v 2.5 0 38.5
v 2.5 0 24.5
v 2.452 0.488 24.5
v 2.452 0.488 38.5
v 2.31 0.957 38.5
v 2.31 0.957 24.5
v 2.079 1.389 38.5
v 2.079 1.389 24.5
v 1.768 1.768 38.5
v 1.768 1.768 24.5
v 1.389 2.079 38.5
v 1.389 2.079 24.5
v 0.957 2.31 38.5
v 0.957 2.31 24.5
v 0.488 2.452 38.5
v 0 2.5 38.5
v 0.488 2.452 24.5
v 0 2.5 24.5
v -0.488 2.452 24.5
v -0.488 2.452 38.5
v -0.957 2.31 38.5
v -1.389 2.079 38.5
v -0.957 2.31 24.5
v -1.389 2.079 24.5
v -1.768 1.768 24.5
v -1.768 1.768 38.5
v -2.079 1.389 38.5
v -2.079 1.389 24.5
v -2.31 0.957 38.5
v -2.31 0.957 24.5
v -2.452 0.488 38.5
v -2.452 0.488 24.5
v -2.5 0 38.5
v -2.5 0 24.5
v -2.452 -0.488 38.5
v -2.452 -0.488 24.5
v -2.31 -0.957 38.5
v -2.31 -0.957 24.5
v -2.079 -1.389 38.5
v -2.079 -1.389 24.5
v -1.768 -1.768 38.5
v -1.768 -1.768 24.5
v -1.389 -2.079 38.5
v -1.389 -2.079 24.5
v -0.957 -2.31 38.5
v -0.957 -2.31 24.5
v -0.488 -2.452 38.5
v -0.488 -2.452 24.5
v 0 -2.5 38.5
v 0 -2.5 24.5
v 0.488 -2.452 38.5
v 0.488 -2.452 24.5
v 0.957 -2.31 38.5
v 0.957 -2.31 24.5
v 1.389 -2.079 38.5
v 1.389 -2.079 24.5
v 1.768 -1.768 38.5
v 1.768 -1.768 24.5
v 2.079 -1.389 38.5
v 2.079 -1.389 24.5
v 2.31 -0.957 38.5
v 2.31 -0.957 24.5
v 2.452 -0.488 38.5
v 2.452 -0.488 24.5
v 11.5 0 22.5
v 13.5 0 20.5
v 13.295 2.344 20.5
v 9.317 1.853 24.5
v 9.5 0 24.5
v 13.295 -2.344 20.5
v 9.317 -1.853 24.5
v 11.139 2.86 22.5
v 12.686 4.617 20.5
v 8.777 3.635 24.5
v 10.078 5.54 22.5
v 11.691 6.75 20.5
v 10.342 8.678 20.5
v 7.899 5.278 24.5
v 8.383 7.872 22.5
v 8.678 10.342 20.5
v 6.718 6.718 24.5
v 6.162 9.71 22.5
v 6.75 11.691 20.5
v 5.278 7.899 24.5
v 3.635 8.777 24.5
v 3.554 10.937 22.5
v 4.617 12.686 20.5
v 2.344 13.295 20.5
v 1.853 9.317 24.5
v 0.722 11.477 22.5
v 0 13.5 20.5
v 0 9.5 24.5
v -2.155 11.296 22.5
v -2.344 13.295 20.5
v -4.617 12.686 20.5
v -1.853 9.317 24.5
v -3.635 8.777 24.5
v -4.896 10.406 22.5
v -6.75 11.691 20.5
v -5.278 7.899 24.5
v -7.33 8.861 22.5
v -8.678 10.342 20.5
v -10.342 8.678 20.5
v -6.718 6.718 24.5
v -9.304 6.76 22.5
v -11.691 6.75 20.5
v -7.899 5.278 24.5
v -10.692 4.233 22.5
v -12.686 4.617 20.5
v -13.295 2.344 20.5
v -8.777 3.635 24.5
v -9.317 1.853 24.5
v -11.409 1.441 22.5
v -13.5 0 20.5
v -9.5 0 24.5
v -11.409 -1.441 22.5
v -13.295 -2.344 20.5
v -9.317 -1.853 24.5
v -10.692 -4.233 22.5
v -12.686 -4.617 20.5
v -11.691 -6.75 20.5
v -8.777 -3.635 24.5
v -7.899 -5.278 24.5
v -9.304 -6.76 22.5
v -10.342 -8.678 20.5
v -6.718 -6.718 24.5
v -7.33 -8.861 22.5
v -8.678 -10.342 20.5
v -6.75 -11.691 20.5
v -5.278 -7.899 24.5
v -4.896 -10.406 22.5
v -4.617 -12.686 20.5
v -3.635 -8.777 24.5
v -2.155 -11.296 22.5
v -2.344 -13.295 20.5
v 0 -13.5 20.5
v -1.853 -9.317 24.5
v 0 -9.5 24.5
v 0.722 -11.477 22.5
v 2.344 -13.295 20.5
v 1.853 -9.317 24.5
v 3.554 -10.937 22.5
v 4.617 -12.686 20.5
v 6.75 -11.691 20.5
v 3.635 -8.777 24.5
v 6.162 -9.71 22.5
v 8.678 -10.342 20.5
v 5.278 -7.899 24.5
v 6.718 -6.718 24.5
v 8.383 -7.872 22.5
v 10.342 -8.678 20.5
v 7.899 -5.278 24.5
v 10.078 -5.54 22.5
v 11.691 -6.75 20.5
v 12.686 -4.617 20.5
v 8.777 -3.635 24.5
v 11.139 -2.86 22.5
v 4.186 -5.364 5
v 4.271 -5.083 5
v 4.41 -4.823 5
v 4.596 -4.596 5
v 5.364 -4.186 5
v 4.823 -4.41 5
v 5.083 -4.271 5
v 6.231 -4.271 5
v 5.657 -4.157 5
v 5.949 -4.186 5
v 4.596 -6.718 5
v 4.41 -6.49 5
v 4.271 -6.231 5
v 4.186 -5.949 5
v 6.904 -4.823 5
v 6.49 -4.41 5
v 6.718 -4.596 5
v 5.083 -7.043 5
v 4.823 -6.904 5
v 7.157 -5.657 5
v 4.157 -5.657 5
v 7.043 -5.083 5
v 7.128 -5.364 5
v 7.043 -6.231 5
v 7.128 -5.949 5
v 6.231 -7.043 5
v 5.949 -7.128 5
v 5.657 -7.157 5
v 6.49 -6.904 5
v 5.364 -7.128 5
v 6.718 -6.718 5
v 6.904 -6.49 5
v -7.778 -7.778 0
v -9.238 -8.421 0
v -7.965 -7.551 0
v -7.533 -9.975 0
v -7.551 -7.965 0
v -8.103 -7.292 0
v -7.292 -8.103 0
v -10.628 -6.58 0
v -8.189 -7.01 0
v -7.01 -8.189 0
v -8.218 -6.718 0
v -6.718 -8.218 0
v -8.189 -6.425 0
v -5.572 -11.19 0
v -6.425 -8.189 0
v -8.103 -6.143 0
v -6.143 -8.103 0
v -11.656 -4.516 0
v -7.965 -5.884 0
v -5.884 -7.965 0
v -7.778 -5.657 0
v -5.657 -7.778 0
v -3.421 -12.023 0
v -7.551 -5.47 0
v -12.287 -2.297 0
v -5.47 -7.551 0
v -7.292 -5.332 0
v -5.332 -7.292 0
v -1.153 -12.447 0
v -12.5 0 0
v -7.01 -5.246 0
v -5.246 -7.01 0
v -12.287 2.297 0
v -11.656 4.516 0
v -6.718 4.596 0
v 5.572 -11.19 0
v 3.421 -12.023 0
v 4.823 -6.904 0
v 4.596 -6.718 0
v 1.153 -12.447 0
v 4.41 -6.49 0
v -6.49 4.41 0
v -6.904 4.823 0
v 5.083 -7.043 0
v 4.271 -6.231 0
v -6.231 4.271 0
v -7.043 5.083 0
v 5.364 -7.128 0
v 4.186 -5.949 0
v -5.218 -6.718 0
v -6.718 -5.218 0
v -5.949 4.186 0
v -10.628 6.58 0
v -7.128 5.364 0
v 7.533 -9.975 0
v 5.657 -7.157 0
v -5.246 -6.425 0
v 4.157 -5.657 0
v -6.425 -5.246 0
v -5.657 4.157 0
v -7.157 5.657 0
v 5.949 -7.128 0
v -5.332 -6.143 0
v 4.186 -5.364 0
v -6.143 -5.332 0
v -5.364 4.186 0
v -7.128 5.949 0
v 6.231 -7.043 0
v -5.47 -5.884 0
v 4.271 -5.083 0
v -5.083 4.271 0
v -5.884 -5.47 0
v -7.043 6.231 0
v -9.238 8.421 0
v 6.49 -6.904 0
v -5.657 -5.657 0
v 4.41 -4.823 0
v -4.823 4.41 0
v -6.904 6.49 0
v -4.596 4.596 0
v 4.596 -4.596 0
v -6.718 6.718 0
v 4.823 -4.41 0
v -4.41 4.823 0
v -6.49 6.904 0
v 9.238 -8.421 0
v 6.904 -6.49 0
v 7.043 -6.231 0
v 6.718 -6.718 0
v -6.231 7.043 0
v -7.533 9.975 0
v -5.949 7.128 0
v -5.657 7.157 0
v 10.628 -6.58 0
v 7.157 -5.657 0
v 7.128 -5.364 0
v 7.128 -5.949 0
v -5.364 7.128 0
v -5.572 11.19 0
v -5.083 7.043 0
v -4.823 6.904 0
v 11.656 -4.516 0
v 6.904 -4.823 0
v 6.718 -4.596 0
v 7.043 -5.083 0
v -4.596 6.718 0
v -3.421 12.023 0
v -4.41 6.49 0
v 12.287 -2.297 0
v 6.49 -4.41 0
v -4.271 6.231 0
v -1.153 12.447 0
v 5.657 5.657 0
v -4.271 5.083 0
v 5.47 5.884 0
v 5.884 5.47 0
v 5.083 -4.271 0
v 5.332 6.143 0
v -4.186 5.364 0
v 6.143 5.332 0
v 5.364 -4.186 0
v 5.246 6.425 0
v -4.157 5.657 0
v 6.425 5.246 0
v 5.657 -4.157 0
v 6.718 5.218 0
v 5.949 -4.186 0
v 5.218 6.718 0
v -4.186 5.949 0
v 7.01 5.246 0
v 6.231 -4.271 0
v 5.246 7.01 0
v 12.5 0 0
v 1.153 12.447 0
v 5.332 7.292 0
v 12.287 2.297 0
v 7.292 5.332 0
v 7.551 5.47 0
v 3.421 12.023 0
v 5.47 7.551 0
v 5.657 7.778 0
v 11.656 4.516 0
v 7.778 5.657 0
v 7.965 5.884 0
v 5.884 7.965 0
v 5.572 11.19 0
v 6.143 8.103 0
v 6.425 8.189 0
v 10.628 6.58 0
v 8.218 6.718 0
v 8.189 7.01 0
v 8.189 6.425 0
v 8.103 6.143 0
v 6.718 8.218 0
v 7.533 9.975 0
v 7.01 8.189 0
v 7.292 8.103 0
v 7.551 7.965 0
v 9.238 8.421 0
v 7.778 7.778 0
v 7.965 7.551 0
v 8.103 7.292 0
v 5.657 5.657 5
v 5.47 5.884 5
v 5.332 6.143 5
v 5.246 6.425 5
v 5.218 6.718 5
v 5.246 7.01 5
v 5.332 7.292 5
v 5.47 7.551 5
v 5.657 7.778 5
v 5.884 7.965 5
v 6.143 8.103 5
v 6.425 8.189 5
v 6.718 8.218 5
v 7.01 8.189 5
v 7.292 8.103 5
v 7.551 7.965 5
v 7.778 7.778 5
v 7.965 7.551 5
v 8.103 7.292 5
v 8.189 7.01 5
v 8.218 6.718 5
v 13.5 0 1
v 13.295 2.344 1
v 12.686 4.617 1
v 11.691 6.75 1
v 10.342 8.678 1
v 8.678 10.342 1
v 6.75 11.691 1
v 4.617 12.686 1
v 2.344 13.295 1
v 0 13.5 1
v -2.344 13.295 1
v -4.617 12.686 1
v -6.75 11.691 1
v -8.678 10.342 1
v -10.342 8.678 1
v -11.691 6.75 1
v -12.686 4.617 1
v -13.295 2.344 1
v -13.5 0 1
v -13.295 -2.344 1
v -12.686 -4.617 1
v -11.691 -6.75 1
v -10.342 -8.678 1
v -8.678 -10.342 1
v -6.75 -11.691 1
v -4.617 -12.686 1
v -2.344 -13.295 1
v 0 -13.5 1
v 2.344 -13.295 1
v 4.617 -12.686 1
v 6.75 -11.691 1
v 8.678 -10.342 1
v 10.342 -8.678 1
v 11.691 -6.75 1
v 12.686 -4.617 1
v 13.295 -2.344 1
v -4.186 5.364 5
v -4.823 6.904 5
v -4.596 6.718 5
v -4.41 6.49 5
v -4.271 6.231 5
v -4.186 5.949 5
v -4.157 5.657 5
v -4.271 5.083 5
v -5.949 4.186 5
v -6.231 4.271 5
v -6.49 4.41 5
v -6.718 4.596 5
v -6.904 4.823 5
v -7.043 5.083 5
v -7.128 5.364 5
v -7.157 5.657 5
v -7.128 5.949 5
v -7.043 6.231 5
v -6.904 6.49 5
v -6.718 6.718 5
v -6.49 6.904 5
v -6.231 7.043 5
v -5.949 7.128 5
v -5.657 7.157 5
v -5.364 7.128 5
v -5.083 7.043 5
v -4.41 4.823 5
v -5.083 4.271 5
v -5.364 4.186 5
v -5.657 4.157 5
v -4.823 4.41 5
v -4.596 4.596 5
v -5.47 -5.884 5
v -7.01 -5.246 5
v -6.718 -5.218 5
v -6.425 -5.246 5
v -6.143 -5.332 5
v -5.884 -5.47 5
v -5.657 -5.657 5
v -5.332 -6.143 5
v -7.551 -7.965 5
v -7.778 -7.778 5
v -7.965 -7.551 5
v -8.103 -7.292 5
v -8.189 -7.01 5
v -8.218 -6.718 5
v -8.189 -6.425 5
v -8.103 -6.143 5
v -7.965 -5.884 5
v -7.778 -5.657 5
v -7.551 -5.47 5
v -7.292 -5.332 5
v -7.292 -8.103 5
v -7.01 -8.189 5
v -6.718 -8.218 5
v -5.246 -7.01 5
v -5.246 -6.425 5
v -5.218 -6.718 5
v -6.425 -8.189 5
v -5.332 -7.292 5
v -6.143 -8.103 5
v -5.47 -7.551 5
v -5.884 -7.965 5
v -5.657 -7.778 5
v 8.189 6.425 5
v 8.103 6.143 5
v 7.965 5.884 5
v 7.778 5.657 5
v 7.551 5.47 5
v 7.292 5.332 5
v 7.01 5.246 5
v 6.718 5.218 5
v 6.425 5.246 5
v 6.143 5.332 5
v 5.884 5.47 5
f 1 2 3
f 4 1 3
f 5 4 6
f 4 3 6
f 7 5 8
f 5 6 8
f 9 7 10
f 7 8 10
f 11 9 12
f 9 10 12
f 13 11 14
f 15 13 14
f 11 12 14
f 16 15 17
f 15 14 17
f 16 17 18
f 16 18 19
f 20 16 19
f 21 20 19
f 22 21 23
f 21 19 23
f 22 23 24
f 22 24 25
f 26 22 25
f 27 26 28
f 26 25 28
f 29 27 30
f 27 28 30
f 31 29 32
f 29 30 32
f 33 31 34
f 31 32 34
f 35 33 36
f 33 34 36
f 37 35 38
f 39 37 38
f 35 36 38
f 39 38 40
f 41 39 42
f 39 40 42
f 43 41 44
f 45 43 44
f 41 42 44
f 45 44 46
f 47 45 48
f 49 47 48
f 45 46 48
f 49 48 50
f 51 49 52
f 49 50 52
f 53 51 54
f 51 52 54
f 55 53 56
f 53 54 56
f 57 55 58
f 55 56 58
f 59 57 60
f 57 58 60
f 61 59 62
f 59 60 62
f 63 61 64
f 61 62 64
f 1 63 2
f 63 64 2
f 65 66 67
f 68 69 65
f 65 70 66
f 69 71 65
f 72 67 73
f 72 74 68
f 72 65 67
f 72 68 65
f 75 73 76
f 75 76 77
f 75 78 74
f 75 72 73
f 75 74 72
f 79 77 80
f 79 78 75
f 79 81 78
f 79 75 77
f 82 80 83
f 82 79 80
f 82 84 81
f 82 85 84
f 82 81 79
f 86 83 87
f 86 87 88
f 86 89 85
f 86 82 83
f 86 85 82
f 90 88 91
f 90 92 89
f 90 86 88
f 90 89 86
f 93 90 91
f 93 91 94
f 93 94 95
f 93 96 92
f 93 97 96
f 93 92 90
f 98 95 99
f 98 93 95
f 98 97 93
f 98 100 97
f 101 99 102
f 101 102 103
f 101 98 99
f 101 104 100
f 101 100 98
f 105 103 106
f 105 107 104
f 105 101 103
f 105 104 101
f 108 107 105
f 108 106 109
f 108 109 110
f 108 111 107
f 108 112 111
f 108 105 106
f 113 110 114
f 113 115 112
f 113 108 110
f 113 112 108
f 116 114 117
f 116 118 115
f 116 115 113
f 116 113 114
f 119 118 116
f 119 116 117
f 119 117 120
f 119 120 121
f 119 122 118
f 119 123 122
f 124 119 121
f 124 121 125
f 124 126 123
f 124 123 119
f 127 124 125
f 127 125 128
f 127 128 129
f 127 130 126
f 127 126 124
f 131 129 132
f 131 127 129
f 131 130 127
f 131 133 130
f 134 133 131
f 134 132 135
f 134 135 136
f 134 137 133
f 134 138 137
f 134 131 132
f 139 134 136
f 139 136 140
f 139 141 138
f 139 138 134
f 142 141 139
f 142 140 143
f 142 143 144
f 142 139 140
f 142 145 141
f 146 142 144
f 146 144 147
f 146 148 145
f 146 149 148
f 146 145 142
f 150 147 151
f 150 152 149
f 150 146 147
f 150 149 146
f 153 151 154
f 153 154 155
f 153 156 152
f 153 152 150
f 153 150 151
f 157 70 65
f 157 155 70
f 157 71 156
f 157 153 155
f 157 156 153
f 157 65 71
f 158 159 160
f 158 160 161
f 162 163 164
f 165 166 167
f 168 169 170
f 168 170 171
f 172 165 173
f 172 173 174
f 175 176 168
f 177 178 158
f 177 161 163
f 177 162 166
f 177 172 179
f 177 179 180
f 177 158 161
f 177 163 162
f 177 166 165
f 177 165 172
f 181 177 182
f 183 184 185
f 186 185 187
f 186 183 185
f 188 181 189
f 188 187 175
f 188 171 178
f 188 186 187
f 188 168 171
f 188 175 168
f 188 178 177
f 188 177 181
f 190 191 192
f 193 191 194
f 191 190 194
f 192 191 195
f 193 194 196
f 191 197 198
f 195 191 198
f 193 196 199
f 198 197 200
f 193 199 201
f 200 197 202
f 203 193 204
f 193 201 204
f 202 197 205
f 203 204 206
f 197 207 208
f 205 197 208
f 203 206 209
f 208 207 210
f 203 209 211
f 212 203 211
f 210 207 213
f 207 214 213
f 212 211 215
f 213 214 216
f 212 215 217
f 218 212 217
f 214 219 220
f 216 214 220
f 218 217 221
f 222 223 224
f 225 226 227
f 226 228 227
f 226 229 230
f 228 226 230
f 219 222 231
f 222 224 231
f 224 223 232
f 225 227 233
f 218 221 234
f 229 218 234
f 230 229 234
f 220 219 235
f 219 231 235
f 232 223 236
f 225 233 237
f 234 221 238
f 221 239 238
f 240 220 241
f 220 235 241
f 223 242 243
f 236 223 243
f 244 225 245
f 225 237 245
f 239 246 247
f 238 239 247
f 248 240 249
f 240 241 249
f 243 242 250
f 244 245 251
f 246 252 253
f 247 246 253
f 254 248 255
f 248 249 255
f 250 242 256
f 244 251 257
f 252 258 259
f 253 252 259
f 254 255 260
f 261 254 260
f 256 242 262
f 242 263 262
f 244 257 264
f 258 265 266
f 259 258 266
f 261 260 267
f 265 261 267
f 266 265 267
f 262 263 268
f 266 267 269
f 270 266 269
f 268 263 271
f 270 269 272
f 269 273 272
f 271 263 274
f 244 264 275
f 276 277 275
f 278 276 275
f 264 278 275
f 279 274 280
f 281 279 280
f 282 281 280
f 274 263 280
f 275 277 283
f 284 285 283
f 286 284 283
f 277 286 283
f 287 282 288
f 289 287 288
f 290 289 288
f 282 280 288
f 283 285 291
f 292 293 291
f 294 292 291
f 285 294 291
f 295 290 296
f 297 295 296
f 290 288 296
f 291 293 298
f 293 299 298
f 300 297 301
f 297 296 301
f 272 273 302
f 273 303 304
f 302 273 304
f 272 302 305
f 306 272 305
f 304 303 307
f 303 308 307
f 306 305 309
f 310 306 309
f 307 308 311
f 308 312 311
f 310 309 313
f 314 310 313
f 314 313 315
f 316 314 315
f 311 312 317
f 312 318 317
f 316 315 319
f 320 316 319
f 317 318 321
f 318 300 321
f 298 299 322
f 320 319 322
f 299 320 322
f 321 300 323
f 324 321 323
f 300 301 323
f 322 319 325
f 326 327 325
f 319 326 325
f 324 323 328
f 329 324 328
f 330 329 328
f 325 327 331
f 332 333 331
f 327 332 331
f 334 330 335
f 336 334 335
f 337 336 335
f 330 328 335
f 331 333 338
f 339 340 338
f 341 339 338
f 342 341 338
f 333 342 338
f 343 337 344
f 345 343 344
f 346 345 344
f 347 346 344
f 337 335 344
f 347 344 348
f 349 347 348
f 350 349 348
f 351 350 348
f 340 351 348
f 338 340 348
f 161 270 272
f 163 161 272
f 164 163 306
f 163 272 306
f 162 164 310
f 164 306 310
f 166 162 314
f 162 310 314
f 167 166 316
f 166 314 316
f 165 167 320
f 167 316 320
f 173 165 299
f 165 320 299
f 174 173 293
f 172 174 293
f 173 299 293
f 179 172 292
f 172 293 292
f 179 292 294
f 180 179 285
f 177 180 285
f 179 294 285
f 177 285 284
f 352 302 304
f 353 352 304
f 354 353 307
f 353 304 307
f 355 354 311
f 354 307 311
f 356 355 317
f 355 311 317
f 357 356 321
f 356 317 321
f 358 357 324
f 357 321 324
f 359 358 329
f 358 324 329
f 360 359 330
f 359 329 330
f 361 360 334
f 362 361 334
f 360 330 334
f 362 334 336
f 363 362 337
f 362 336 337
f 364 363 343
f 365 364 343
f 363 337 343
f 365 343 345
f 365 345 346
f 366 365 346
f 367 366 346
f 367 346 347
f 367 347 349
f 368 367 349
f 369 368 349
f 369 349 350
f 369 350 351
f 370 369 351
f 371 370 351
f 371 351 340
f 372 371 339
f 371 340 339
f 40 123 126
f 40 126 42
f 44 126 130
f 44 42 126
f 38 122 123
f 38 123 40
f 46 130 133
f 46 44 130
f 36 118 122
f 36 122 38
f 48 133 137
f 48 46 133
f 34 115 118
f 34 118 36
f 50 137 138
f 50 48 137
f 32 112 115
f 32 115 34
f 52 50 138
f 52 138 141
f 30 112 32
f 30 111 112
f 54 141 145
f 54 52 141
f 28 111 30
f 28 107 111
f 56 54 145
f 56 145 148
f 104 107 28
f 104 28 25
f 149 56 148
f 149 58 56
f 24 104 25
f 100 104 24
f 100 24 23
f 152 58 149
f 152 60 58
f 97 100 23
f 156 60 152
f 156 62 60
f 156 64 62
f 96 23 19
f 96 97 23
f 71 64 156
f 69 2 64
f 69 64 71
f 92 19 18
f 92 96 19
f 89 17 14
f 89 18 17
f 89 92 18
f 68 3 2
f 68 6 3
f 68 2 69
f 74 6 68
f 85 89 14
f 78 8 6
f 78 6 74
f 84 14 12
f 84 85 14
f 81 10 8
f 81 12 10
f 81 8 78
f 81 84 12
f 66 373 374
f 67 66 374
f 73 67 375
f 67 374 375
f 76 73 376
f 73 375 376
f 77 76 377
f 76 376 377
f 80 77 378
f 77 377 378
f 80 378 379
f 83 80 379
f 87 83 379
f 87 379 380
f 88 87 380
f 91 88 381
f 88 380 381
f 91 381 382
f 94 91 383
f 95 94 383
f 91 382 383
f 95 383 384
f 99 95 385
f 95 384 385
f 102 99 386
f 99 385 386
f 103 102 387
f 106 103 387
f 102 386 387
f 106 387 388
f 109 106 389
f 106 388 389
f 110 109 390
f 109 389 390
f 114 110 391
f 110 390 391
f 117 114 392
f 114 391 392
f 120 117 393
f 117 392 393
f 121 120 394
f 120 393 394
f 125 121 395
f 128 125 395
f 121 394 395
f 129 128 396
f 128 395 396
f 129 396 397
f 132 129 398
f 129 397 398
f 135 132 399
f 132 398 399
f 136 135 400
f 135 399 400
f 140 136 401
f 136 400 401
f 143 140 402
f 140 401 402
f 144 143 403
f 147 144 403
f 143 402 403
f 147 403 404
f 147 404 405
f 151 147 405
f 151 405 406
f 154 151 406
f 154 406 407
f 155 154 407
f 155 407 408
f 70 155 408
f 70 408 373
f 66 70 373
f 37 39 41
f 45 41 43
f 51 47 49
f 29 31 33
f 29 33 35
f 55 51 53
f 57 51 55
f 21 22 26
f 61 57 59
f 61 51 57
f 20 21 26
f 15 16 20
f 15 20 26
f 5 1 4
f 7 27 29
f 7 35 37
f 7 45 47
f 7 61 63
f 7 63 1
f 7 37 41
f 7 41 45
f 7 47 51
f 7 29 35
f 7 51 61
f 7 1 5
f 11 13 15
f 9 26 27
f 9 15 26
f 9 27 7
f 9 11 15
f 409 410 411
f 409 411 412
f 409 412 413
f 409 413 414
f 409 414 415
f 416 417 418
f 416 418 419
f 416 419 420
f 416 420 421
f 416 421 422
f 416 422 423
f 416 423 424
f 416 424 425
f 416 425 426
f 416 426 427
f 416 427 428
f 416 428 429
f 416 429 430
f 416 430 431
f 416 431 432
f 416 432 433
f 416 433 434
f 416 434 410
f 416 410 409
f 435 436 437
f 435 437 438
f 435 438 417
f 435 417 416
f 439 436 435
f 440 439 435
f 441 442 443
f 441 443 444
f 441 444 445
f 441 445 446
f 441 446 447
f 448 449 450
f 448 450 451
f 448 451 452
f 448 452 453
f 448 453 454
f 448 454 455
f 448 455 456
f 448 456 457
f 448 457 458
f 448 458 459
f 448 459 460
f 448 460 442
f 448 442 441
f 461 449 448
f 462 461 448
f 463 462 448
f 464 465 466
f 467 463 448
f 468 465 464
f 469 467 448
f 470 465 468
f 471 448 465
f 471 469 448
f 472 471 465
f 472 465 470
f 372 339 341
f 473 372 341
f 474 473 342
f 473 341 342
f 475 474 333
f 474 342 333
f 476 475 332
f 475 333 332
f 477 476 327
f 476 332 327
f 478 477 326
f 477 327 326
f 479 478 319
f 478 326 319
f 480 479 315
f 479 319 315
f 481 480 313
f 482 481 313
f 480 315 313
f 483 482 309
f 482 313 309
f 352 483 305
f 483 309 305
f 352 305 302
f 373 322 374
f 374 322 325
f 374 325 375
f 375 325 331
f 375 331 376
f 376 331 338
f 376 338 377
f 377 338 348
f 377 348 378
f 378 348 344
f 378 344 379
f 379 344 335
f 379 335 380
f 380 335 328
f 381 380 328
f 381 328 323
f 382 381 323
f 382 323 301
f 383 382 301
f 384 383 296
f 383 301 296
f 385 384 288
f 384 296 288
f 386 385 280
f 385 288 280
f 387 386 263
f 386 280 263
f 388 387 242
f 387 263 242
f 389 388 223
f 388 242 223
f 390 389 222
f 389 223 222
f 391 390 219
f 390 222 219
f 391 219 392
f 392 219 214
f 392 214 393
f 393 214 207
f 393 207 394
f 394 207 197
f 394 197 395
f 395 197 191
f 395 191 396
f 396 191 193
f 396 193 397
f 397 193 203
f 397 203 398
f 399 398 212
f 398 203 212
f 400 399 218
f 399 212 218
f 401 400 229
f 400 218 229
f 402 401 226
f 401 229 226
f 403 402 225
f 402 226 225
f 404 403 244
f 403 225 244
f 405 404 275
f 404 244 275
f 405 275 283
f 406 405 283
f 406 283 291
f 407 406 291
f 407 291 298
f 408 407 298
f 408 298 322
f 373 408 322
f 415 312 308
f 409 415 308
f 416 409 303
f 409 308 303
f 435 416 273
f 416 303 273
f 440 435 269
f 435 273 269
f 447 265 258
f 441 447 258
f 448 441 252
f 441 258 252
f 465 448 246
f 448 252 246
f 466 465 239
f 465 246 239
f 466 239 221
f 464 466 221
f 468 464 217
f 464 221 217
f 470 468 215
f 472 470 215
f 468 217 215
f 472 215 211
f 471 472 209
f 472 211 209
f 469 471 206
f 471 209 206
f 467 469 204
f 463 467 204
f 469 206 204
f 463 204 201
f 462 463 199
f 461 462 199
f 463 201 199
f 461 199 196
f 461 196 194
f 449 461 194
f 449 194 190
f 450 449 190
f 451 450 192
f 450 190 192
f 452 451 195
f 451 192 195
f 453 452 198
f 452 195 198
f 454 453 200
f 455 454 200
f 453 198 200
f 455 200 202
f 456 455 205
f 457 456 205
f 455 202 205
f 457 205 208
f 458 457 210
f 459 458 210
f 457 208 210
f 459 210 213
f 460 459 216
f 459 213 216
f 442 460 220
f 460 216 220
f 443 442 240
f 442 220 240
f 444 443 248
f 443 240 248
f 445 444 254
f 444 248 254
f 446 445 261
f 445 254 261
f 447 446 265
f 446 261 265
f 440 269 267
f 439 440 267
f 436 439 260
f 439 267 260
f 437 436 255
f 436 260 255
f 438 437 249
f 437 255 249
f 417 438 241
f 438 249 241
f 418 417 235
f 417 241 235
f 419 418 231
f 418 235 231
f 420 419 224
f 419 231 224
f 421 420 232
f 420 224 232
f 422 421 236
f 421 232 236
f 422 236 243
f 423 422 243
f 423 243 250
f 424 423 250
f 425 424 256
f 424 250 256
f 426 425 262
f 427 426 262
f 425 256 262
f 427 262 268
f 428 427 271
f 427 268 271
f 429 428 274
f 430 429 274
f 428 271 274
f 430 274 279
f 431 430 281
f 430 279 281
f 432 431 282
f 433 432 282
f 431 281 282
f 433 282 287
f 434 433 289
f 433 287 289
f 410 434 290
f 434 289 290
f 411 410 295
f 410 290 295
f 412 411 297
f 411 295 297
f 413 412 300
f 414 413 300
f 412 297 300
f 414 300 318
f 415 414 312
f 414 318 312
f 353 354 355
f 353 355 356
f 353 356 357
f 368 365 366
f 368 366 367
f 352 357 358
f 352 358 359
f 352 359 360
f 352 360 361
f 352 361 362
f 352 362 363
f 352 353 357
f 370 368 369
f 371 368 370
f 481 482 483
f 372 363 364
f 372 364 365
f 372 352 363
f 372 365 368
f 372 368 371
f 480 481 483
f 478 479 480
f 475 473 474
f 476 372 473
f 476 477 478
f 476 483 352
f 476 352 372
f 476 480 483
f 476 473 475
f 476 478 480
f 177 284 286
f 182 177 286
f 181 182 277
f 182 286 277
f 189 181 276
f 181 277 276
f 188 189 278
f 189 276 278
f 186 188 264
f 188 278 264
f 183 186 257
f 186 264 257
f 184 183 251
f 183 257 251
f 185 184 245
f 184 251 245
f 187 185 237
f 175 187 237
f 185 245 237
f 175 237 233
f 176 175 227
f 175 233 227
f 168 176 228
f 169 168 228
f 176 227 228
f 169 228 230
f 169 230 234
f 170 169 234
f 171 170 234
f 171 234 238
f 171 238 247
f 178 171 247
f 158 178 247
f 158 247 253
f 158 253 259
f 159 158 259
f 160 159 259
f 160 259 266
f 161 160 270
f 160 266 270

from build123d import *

# Parameters (mm, degrees)
F0_R     = 13.5
F1_DEPTH = 24.5
F2_R     = 2.5
F3_DEPTH = 14
F5_DEPTH = 5
F6_SIZE  = 1
F7_SIZE  = 4


with BuildPart() as f1:
    # F0 (on Top) → F1 (new body)
    with BuildSketch(Plane.XY):
        Circle(F0_R)
    extrude(amount=F1_DEPTH)

    # F2 (on face) → F3 (join)
    with BuildSketch(Plane.XY.offset(24.5)):
        Circle(F2_R)
    extrude(amount=F3_DEPTH)

    # F4 (on face) → F5 (cut)
    with BuildSketch(Plane(origin=(0, 0, 0), x_dir=(1, 0, 0), z_dir=(0, 0, -1))):
        with BuildLine():
            ThreePointArc((8.217514, -6.717514), (7.29154, -5.331695), (5.656854, -5.656854))
            ThreePointArc((5.656854, -5.656854), (6.143489, -8.103334), (8.217514, -6.717514))
        make_face()
        with BuildLine():
            ThreePointArc((-5.217514, 6.717514), (-8.103334, 7.29154), (-5.656854, 5.656854))
            ThreePointArc((-5.656854, 5.656854), (-5.331695, 6.143489), (-5.217514, 6.717514))
        make_face()
        with BuildLine():
            ThreePointArc((7.156854, 5.656854), (5.082829, 7.042674), (4.596194, 4.596194))
            ThreePointArc((4.596194, 4.596194), (6.230879, 4.271035), (7.156854, 5.656854))
        make_face()
        with BuildLine():
            ThreePointArc((-4.156854, -5.656854), (-4.271035, -5.082829), (-4.596194, -4.596194))
            ThreePointArc((-4.596194, -4.596194), (-7.042674, -6.230879), (-4.156854, -5.656854))
        make_face()
    extrude(amount=-F5_DEPTH, mode=Mode.SUBTRACT)

    # F6
    f6_edges = [f1.edges().sort_by_distance(p)[0] for p in [
        (-13.5, 0, 0),
    ]]
    chamfer(f6_edges, length=F6_SIZE)

    # F7
    f7_edges = [f1.edges().sort_by_distance(p)[0] for p in [
        (-13.5, 0, 24.5),
    ]]
    chamfer(f7_edges, length=F7_SIZE)


solid = f1.part
